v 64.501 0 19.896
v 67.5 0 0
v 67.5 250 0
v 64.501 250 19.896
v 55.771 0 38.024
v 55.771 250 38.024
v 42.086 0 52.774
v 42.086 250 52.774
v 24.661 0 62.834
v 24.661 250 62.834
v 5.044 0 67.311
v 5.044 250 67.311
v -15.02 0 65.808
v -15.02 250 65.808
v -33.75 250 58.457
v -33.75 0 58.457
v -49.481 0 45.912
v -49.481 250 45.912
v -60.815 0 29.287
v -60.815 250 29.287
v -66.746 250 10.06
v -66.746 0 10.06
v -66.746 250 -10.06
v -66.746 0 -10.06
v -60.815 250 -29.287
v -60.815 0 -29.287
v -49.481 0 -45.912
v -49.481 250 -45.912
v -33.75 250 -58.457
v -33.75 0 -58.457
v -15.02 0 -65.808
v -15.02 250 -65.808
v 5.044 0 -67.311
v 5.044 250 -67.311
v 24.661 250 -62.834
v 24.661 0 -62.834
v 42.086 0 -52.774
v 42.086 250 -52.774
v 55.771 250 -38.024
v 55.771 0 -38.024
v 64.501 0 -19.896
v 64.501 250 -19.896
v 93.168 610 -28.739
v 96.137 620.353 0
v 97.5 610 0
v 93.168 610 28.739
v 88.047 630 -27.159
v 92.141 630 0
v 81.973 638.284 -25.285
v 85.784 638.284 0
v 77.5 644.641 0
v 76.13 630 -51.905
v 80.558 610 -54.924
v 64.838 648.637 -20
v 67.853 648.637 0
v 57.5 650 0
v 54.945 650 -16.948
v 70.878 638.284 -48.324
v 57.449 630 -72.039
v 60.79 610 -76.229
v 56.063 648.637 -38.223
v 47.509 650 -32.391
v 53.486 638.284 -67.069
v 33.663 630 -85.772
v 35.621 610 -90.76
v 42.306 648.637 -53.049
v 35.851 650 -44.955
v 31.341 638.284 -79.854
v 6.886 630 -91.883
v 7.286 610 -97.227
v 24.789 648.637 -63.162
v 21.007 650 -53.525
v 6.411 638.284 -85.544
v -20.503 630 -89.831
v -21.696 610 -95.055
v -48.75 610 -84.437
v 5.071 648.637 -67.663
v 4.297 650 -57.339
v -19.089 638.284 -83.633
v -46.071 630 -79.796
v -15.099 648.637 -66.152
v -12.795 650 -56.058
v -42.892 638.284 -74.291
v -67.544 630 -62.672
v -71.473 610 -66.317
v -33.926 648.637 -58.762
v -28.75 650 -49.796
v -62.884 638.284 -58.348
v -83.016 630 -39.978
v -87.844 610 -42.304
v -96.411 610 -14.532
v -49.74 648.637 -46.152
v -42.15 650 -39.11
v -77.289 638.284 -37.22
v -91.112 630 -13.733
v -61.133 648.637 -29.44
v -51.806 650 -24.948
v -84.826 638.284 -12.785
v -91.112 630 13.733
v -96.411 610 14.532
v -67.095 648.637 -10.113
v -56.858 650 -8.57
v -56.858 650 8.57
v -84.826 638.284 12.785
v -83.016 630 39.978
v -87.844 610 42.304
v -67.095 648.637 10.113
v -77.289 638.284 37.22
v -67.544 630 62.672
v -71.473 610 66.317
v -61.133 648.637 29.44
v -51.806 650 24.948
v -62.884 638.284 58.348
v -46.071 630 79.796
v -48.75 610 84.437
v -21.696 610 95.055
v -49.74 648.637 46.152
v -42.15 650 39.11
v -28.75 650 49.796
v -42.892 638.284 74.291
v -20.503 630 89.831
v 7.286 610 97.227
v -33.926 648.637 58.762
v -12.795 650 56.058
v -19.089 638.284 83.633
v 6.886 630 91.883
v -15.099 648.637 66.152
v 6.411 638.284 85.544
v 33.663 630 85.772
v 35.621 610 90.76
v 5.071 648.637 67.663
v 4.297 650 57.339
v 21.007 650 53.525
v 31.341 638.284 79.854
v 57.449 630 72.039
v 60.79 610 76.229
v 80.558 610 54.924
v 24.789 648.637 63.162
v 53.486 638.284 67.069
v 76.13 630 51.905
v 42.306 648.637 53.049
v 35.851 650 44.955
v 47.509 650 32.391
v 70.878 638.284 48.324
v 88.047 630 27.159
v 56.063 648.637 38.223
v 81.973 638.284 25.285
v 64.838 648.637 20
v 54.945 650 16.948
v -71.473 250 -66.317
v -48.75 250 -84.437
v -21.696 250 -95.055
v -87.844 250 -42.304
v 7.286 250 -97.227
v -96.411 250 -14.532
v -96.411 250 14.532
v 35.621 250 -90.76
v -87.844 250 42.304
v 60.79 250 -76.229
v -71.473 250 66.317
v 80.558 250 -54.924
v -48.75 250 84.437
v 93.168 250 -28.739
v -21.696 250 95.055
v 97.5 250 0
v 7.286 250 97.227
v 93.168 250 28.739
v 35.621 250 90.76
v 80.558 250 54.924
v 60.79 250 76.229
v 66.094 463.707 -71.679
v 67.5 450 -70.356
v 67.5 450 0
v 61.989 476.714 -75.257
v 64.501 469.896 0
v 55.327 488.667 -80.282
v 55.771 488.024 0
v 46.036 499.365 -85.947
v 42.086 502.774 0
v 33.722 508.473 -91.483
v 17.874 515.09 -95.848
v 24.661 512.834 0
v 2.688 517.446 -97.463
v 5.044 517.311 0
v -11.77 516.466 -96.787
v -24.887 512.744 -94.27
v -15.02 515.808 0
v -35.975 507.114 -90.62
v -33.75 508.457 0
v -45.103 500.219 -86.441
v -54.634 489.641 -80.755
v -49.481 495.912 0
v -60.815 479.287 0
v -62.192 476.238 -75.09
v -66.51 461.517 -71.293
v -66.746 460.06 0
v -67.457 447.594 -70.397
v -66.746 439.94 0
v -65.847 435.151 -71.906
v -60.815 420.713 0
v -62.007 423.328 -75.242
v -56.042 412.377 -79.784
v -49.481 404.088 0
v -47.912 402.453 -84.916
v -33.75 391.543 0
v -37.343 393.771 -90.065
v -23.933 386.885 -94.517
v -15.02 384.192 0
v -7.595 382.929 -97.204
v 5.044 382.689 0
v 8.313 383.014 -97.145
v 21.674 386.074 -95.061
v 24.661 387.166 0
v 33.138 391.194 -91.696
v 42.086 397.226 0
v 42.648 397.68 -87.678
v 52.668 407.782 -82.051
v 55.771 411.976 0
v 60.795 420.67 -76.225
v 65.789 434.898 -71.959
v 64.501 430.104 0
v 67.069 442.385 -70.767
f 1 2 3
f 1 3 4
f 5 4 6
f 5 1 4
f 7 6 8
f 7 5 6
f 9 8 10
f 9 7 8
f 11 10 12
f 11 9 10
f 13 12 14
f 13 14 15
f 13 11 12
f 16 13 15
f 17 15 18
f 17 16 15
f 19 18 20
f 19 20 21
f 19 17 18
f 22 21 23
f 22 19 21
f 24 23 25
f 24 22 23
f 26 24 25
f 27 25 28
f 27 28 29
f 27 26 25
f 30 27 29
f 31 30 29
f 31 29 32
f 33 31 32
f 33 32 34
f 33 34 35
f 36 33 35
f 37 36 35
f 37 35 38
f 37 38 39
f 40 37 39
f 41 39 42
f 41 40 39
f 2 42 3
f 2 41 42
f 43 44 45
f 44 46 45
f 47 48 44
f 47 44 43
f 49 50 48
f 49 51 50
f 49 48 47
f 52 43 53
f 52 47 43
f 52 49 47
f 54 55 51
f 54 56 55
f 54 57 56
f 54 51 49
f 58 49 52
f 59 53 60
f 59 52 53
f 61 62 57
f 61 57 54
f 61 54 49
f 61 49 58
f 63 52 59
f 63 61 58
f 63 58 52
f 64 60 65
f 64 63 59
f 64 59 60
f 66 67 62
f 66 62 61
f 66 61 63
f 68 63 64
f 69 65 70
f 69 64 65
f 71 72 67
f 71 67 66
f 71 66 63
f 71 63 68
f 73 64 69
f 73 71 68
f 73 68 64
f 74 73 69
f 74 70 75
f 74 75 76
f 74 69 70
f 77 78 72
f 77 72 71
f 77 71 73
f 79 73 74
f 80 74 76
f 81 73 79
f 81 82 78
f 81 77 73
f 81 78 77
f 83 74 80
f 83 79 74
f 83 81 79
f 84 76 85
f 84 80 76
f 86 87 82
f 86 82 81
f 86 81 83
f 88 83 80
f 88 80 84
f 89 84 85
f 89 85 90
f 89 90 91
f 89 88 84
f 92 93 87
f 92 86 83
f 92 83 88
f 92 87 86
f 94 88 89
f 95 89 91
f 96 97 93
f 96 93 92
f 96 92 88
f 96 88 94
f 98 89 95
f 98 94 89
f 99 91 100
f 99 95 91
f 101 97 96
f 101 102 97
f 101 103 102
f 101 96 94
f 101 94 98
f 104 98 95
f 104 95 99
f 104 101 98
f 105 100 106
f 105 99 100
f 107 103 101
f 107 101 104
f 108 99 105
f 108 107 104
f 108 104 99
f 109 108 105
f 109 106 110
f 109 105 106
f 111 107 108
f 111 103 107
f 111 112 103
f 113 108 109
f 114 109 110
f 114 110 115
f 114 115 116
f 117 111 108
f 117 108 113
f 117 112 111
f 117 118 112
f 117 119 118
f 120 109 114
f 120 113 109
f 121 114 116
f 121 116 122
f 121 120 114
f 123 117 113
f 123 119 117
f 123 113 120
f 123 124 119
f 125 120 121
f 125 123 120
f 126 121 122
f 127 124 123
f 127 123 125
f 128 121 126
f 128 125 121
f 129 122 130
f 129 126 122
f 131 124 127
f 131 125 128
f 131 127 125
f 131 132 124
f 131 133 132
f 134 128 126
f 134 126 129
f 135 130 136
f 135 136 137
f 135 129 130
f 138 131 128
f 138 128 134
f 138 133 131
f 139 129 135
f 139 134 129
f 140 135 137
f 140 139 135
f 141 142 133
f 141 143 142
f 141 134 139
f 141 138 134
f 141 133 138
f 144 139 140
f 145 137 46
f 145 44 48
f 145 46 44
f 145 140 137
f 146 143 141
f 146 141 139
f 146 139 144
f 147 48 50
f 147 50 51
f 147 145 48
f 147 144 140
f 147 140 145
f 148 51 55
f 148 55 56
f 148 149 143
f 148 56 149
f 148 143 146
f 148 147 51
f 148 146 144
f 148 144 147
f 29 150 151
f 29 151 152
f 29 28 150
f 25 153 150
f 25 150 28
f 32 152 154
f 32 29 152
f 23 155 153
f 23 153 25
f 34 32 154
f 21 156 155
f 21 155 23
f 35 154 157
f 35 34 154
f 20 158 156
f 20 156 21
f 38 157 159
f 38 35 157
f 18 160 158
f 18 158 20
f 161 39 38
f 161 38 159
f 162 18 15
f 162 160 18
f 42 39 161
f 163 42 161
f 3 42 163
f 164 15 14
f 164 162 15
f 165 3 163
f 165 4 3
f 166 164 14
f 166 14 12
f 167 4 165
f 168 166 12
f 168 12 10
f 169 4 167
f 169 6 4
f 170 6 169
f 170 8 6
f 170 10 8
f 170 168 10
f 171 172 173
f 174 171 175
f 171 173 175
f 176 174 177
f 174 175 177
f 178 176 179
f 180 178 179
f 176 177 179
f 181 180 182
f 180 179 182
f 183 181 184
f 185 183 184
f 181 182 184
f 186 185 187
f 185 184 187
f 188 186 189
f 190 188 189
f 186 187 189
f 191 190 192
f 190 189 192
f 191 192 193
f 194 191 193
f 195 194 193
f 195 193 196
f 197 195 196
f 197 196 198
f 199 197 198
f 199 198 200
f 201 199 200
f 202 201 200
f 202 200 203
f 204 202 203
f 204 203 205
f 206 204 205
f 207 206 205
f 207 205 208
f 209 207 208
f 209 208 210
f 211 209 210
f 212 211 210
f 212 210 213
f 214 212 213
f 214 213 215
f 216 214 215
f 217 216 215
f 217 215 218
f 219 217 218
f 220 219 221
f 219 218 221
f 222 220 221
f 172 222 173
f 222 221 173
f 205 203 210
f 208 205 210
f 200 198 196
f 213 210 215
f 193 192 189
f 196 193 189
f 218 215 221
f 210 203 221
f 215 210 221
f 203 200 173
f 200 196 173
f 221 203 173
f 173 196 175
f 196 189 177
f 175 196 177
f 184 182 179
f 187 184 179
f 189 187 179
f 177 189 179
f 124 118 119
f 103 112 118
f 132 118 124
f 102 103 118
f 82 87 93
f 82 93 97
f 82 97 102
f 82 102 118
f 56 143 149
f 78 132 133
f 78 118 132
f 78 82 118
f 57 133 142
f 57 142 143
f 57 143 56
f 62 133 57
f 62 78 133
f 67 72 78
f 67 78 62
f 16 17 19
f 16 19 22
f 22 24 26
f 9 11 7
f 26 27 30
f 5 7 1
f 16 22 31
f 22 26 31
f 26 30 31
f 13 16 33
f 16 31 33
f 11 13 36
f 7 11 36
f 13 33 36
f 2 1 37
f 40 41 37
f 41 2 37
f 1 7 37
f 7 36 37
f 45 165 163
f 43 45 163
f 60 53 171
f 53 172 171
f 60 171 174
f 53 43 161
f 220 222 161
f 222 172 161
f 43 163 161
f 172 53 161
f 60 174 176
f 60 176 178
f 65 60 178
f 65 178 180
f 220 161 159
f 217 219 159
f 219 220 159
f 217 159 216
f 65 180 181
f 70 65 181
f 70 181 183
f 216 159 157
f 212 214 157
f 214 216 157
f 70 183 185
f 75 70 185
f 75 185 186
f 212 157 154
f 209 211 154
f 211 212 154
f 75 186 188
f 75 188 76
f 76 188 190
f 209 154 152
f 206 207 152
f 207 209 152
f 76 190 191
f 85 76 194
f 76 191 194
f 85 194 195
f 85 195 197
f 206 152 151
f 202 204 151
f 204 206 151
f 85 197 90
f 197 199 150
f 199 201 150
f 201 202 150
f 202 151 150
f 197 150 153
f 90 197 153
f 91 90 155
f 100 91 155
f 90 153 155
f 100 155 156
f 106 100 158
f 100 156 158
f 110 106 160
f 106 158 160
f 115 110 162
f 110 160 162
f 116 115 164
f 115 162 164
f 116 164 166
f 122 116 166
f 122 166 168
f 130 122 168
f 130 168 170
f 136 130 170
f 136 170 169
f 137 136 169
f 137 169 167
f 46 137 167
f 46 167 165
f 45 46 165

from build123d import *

# Parameters (mm, degrees)
SKETCH1_R           = 97.5
BOSS_EXTRUDE1_DEPTH = 650
SKETCH2_R           = 97.5
SKETCH2_R_2         = 67.5
CUT_EXTRUDE4_DEPTH  = 250
SKETCH4_R           = 67.5
CUT_EXTRUDE3_DEPTH  = 98.5
FILLET1_R           = 40


with BuildPart() as part:
    # Sketch1 → Boss-Extrude1 (new body)
    with BuildSketch(Plane(origin=(0, 0, 0), x_dir=(1, 0, 0), z_dir=(0, 1, 0))):
        Circle(SKETCH1_R)
    extrude(amount=BOSS_EXTRUDE1_DEPTH)

    # Sketch2 → Cut-Extrude4 (cut)
    with BuildSketch(Plane.XZ):
        Circle(SKETCH2_R)
        Circle(SKETCH2_R_2, mode=Mode.SUBTRACT)
    extrude(amount=-CUT_EXTRUDE4_DEPTH, mode=Mode.SUBTRACT)

    # Sketch4 → Cut-Extrude3 (cut, through all)
    with BuildSketch(Plane.XY):
        with Locations((0, 450)):
            Circle(SKETCH4_R)
    extrude(amount=-CUT_EXTRUDE3_DEPTH, mode=Mode.SUBTRACT)

    # Fillet1
    fillet1_edges = [part.edges().sort_by_distance(p)[0] for p in [
        (-97.5, 650, 0),
    ]]
    fillet(fillet1_edges, radius=FILLET1_R)


solid = part.part
